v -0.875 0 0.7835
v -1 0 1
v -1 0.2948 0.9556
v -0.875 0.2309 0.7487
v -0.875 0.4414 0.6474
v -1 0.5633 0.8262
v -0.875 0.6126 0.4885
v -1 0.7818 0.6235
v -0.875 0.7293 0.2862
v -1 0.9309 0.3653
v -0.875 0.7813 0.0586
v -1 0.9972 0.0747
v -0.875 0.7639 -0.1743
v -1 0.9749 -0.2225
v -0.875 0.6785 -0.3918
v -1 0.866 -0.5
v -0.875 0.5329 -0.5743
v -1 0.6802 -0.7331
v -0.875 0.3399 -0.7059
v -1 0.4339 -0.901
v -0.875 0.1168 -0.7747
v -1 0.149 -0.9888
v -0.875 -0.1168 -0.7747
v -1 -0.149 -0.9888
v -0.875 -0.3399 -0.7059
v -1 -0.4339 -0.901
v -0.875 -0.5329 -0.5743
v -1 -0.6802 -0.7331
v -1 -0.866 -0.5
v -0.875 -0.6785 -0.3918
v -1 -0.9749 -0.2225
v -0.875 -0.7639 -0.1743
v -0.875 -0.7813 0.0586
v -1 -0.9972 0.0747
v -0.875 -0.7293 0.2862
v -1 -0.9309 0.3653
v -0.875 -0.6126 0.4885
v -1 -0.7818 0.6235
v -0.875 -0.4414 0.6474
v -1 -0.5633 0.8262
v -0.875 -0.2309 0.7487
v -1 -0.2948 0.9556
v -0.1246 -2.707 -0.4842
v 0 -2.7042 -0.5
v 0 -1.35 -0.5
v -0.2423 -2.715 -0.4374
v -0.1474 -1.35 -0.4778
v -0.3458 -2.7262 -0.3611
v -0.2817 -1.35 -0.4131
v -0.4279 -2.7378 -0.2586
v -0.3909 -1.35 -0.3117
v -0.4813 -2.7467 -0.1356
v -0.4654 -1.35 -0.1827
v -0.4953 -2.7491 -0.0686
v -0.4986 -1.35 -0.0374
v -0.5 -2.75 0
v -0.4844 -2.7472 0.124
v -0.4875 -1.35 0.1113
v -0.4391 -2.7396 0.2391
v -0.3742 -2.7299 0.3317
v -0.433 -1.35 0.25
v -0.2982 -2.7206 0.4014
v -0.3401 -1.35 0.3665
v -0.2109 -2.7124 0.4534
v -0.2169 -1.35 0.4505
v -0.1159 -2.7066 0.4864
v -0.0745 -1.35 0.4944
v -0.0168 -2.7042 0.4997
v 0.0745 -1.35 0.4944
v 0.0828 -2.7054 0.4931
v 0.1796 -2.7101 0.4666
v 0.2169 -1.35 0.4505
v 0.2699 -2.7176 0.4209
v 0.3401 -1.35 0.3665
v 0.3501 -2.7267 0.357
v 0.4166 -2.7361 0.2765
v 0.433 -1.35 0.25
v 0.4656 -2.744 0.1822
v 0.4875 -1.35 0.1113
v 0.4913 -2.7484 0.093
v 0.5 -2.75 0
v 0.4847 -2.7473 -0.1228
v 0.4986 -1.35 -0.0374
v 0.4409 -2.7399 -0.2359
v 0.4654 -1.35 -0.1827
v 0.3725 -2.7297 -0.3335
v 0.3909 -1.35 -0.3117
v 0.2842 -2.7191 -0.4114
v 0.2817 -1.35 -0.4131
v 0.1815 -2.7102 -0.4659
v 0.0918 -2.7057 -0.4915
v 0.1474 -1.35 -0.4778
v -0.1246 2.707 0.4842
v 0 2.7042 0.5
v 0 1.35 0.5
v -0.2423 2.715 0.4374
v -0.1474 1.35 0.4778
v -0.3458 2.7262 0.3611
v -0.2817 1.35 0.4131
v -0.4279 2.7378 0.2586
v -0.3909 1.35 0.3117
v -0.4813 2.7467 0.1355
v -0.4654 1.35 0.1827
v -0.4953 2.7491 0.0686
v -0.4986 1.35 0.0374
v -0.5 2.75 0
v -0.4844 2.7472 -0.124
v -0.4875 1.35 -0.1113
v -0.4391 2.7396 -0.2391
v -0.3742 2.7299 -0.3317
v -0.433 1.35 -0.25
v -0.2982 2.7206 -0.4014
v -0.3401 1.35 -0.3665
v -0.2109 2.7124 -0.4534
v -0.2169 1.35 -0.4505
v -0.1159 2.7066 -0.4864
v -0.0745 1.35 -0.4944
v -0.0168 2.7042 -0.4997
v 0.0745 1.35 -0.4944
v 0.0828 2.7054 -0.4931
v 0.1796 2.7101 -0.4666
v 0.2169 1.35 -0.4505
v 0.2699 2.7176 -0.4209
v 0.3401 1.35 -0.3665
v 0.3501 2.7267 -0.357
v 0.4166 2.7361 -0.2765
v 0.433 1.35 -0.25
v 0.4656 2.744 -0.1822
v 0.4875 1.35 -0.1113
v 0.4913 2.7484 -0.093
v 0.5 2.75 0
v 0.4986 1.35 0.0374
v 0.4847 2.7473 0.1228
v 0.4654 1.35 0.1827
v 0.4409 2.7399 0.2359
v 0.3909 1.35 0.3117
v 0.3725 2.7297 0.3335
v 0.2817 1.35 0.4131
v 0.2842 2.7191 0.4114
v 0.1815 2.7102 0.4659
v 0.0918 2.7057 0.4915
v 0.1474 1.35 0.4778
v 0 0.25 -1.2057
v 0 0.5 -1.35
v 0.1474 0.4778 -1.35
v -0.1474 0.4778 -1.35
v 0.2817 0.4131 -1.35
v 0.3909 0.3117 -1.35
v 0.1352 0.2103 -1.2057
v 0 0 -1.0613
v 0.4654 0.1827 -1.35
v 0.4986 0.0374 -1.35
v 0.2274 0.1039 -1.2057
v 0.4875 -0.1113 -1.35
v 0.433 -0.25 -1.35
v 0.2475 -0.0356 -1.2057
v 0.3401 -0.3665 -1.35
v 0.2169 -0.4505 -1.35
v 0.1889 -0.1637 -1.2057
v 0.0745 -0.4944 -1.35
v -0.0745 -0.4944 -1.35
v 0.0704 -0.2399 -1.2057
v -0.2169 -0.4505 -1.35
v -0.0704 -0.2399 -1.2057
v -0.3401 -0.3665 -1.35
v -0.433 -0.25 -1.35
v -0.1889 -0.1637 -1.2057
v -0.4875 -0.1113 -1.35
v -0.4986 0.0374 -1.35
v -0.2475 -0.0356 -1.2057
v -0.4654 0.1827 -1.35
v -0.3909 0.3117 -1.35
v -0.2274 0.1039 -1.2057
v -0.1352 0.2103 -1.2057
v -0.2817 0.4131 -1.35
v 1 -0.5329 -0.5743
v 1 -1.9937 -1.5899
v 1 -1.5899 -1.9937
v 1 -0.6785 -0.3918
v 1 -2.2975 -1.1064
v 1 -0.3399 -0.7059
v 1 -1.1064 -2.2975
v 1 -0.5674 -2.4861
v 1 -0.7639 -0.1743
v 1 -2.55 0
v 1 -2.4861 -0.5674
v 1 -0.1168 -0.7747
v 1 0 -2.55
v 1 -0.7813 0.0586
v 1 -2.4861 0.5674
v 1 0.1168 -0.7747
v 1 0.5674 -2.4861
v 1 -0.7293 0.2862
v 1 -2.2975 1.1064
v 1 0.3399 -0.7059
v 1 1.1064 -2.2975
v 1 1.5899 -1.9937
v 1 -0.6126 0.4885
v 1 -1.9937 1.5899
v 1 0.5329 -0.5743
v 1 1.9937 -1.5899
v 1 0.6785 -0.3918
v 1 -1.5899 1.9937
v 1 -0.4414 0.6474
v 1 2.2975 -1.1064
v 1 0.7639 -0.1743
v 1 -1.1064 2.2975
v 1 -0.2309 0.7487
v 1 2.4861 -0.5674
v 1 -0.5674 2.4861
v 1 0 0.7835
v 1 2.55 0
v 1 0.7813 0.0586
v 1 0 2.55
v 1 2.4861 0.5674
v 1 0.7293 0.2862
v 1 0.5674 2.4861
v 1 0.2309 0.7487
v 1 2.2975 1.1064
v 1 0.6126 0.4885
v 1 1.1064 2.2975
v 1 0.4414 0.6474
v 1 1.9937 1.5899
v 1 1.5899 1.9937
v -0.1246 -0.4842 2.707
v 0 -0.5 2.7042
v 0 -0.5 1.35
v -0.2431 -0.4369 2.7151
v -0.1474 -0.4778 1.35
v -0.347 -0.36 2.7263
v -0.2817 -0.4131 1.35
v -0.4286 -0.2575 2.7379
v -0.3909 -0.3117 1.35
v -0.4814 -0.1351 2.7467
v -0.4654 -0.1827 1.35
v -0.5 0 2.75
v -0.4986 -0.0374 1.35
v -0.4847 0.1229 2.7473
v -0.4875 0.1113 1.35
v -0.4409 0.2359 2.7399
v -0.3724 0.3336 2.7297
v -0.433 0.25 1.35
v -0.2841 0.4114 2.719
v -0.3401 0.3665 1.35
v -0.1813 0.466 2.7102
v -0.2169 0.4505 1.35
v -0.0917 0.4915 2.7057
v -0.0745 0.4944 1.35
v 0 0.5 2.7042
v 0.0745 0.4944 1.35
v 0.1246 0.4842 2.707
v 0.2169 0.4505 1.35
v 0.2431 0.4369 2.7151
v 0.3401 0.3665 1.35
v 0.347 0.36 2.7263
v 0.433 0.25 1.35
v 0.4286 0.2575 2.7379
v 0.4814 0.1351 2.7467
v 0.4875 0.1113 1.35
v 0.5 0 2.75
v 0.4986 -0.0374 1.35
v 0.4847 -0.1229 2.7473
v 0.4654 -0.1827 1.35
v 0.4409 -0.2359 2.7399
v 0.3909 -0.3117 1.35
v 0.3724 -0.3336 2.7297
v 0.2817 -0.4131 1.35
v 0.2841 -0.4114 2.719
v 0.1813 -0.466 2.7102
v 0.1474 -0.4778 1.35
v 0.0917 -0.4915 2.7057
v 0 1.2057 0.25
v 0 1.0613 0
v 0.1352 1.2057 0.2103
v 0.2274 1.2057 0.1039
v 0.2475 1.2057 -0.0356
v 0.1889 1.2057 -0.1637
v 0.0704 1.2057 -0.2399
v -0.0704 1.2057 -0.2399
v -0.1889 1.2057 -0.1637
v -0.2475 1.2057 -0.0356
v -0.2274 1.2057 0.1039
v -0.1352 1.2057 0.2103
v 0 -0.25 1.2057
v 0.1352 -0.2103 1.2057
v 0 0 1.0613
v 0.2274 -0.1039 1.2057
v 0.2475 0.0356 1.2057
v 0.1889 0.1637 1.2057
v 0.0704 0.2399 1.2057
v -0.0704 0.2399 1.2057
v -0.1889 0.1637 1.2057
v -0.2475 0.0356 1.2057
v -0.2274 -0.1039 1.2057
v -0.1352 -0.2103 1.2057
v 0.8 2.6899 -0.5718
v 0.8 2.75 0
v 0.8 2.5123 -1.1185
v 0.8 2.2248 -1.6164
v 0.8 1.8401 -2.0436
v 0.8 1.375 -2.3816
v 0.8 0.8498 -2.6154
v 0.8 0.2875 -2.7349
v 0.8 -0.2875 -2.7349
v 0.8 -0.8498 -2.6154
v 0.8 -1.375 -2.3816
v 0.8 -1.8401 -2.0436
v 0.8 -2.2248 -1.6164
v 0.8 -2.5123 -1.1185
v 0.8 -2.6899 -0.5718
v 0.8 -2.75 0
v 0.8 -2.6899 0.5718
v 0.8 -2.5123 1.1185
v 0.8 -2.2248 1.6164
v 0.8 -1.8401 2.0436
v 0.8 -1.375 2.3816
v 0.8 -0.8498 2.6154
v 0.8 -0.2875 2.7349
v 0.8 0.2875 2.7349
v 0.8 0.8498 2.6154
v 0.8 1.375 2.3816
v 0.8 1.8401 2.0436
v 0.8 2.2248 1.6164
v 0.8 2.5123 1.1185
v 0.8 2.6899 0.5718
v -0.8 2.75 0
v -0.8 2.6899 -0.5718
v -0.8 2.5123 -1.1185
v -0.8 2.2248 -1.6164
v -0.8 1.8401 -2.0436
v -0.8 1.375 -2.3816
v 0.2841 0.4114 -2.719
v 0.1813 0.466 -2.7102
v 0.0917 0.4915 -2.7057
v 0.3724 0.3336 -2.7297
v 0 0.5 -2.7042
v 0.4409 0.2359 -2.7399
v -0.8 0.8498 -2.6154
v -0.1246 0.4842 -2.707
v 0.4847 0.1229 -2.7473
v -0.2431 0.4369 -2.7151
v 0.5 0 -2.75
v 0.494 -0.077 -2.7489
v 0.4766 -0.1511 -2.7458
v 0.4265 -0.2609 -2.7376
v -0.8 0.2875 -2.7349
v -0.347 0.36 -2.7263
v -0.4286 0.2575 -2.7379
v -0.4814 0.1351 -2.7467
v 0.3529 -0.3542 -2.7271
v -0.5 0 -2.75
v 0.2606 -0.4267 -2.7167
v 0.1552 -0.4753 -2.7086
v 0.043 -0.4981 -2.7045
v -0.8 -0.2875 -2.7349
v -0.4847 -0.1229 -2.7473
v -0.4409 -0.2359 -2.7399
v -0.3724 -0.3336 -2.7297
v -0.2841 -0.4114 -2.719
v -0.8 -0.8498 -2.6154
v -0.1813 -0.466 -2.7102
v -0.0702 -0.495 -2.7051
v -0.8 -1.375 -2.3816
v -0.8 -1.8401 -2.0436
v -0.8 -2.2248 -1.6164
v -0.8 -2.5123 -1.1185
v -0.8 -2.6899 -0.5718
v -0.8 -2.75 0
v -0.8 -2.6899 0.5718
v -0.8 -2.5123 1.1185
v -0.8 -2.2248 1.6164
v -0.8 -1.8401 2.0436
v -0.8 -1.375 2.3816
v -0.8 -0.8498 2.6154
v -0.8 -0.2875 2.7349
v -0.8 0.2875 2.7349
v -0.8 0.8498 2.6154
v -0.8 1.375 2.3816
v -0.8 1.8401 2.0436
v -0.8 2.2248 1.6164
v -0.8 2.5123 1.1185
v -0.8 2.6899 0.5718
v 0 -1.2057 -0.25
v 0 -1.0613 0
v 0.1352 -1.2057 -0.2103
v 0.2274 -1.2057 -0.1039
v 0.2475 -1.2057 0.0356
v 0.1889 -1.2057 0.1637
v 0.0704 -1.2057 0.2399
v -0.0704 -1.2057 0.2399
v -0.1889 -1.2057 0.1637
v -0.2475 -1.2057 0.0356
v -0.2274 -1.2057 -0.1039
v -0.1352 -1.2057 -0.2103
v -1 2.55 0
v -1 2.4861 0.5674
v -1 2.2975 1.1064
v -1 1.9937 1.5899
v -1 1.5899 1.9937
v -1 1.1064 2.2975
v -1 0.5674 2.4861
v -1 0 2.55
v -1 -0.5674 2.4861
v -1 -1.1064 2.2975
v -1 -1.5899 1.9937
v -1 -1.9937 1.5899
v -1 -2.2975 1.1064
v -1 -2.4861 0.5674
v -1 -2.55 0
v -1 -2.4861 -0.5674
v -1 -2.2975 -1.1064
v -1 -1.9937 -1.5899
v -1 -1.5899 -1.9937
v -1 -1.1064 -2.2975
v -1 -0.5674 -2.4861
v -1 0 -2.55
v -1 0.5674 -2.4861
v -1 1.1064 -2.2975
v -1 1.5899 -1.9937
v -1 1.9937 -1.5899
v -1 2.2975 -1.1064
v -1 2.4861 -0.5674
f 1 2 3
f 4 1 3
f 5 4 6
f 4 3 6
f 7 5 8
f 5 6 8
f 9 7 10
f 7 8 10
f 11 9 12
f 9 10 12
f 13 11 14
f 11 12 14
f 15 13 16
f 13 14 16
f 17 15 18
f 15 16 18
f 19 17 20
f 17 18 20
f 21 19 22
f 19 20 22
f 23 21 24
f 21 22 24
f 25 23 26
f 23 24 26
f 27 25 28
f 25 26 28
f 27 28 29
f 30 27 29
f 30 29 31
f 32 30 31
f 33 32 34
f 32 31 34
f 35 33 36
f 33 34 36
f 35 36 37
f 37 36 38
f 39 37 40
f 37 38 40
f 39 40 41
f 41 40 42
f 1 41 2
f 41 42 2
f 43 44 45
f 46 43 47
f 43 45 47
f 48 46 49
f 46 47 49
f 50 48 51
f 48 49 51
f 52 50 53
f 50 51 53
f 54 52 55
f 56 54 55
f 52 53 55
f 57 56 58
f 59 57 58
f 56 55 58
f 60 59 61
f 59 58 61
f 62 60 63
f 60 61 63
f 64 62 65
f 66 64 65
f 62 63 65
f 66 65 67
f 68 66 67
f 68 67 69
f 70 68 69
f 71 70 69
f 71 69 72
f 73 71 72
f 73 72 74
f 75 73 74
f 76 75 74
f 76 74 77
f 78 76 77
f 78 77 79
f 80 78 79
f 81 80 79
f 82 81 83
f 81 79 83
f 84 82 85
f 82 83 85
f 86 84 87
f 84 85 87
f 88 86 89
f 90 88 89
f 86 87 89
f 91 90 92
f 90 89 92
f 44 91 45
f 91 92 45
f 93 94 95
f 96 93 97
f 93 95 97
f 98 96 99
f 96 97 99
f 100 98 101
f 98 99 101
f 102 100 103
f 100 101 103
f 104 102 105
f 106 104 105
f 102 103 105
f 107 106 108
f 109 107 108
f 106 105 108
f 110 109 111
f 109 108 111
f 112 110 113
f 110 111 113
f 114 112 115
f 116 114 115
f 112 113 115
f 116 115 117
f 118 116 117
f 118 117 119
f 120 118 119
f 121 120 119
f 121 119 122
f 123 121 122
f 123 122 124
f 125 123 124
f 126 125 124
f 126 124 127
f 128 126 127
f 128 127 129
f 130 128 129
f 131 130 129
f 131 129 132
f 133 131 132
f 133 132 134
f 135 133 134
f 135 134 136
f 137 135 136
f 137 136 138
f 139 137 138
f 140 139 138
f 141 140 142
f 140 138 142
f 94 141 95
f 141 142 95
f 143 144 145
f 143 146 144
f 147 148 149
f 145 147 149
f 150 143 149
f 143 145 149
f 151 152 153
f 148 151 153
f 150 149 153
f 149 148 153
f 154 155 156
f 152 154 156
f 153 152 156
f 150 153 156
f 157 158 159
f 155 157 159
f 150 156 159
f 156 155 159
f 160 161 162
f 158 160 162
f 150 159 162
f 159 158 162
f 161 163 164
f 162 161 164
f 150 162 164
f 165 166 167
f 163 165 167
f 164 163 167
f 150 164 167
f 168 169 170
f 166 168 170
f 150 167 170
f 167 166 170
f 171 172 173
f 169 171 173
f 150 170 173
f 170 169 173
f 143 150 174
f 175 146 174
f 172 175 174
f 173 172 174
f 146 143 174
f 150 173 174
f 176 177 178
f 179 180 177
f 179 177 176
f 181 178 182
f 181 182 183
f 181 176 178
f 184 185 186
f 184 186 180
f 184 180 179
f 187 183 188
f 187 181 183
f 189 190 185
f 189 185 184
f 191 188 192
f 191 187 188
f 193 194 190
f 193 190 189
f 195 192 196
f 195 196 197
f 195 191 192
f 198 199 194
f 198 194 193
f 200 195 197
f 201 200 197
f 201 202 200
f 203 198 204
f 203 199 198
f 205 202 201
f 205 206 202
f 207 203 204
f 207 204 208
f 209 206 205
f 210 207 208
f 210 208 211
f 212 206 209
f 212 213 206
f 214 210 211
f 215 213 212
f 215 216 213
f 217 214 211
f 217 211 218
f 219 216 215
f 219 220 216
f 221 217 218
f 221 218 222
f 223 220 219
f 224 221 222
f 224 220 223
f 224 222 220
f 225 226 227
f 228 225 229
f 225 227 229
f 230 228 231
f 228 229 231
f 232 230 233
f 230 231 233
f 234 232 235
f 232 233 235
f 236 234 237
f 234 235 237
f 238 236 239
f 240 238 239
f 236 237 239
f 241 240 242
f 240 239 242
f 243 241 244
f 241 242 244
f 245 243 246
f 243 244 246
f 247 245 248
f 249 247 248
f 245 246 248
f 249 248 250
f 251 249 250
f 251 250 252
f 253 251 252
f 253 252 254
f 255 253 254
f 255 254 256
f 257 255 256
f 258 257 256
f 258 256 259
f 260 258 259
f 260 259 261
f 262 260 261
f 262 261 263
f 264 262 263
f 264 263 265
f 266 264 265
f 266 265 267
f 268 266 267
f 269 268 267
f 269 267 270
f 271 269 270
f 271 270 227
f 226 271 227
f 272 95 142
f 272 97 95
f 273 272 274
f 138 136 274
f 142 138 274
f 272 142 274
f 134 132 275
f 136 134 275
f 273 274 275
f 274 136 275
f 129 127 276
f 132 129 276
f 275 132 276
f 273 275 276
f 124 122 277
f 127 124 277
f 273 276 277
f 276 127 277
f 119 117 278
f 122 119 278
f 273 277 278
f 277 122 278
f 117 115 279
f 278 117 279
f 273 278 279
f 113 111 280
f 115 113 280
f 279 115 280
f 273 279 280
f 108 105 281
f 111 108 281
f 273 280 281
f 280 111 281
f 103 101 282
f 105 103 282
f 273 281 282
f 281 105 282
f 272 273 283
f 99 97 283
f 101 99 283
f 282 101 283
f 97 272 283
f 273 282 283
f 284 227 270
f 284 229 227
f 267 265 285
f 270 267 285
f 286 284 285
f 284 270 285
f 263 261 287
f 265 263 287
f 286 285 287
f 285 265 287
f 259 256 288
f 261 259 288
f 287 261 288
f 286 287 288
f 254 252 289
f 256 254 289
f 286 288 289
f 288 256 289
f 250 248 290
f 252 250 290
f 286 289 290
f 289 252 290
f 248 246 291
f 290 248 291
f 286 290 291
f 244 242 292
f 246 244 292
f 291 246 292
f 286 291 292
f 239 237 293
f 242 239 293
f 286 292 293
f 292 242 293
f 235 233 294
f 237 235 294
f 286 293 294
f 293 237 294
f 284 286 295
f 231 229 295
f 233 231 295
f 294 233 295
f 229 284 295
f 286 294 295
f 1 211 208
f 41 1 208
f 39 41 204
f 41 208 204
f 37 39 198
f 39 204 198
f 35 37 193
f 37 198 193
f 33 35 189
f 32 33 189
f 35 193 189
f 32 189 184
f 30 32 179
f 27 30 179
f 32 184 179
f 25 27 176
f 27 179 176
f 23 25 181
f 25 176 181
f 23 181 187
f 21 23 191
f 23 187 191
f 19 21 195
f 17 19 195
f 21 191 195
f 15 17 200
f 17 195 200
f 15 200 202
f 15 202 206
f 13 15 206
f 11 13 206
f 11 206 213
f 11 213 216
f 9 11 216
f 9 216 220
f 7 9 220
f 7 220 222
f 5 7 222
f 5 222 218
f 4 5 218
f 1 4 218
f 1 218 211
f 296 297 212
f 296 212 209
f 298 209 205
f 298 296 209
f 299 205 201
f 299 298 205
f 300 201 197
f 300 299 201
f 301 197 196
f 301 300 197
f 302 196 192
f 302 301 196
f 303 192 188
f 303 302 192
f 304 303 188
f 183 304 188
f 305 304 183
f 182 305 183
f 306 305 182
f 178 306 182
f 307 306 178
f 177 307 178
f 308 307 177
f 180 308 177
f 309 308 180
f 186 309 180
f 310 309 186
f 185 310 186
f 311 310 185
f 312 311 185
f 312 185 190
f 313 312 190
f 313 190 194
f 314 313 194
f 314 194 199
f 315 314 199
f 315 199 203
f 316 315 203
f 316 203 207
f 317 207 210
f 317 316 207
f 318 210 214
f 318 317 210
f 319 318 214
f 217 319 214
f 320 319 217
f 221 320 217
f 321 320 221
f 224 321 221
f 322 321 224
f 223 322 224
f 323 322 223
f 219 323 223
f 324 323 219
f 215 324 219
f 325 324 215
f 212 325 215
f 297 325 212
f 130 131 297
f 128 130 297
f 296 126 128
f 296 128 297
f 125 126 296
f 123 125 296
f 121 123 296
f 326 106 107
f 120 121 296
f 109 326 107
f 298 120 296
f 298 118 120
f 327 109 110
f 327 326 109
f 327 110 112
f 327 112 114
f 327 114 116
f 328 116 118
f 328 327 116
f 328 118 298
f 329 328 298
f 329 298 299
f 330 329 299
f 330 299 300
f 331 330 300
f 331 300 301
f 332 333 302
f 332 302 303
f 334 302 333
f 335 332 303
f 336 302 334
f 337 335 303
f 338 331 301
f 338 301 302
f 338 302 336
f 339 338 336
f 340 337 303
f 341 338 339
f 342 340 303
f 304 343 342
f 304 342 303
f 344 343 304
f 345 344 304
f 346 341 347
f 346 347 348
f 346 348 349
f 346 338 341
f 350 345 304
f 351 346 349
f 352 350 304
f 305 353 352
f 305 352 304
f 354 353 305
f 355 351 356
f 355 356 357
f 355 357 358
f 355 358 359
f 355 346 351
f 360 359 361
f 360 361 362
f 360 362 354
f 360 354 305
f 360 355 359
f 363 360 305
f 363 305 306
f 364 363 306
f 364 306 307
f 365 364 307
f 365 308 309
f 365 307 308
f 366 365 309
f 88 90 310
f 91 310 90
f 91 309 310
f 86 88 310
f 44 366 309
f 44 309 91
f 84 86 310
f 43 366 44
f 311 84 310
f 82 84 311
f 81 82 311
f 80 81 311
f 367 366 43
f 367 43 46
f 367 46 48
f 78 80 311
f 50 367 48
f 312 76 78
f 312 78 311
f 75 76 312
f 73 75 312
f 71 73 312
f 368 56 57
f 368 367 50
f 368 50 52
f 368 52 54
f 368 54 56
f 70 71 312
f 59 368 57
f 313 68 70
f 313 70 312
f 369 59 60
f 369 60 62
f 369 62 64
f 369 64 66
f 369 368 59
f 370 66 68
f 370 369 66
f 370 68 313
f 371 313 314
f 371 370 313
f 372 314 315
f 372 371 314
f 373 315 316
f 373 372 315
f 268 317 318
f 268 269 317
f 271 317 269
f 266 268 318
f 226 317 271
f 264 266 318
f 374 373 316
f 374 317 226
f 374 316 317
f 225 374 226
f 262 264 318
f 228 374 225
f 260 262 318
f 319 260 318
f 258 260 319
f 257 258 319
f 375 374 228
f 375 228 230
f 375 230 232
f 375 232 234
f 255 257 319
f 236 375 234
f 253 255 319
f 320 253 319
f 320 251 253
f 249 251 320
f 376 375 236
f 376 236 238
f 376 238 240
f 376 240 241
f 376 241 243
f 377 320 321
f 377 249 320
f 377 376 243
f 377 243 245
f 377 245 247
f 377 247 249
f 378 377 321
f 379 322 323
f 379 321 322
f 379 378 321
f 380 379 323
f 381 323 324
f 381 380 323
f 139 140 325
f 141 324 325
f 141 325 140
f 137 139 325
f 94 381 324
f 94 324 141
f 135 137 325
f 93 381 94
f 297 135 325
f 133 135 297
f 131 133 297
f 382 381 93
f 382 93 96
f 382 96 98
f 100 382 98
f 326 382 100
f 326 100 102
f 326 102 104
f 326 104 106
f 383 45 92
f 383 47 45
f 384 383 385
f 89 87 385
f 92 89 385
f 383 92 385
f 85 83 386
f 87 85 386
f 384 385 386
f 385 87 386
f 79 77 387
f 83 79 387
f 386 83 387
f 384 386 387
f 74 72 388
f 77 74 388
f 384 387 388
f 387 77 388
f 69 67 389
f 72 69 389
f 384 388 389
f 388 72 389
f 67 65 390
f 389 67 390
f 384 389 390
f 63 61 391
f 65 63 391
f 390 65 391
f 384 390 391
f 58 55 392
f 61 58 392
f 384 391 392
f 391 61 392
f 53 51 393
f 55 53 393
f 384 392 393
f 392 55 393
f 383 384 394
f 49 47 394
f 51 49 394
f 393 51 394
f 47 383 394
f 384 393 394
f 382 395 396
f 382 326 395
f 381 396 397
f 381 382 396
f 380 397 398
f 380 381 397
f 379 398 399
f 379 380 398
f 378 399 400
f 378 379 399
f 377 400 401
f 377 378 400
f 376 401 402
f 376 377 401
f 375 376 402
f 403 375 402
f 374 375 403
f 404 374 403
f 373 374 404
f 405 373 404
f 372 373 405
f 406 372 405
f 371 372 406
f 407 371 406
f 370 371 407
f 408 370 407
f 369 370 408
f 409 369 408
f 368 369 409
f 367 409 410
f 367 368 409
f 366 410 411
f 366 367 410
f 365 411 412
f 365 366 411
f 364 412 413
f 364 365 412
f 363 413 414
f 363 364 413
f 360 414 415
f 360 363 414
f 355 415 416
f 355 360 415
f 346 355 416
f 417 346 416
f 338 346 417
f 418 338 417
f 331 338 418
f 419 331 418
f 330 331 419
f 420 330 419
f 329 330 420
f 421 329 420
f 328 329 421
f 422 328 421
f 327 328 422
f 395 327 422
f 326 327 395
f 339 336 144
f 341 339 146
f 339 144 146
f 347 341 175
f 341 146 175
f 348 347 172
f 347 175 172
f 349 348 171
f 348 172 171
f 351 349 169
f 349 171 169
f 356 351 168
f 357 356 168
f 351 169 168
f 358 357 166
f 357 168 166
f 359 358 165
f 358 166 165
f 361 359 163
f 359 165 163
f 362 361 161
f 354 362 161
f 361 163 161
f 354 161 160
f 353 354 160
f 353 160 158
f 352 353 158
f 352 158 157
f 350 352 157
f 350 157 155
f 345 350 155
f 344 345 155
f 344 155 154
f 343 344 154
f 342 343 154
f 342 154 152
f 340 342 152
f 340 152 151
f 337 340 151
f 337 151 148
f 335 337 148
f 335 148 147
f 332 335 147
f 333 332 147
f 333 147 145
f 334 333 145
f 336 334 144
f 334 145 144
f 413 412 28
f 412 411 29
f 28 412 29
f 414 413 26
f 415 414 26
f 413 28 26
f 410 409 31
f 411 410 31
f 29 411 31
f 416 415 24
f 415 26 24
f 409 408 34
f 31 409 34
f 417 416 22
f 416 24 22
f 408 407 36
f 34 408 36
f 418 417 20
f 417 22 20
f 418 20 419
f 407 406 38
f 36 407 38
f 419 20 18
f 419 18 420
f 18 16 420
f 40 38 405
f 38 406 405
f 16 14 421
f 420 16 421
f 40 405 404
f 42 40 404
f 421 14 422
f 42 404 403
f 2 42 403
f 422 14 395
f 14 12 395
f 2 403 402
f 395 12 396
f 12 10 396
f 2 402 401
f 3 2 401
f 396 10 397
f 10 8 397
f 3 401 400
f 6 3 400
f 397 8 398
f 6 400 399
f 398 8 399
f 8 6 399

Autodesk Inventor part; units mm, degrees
ref_plane "YZ Plane" through (0, 0, 0) normal (1, 0, 0) x (0, 1, 0)
sketch "Sketch1" plane through (0, 0, 0) normal (1, 0, 0) x (0, 1, 0)
  circle A0 centre (0, 0) radius 2.75
  dimension "d0" = 5.5
extrude "Body" add sketch "Sketch1" along normal mid plane 2
sketch "Sketch2" plane through (-1, 0, 0) normal (-1, 0, 0) x (0, 0, 1)
  line L0 (0, -3.85) -> (0, 3.85) projected
  line L1 (-3.85, 0) -> (3.85, 0) projected
  point P0 (0, 0)
  point P1 (0, 0)
hole "Thread" at (-1, 0, 0) direction (1, 0, 0) diameter 1.567 end through all thread size "M2x0.4" class "6H" standard "ISO Metric profile"
ref_plane "Work Plane1" through (0, 0, 2.75) normal (0, 0, 1) x (1, 0, 0)
sketch "Sketch3" plane through (0, 0, 2.75) normal (0, 0, 1) x (1, 0, 0)
  line L0 (-1.4, 0) -> (1.4, 0) projected
  line L1 (0, 3.85) -> (0, -3.85) projected
  point P0 (0, 0)
hole "Hole" at (0, 0, 2.75) direction (0, 0, -1) diameter 1 depth 1.4 tip angle 120
pattern_circular "Holes" count 4 over 360 about axis through (-10, 0, 0) along (1, 0, 0) of "Hole"
chamfer "Chamfer1" distance 0.2 angle 45 1 edges at (-1, -2.75, 0) measured on face at (-0.0044, -2.5506, 1.028)
chamfer "Chamfer2" distance 0.2 angle 45 1 edges at (1, -2.75, 0) measured on face at (0.0623, -2.5506, 1.028)
chamfer "Chamfer3" distance 0.2165 angle 30 1 edges at (-1, 0, -0.7835) measured on face at (-1, 1.9346, -0.2349)
ref_plane "Work Plane3" through (7.0312, 0, 0) normal (0, 1, 0) x (-1, 0, 0)
equation "\"d0\" = SD2"
equation "\"d1\" = KOH"
equation "\"d7\" = BOR"
equation "\"d9\" = ANG"
equation "\"d8\" = LOTI"
equation "\"d3\" = PHH1"
equation "\"d61\" = PHH1"
equation "\"d5\" = PHH"
equation "\"d62\" = PHH"
equation "\"d12\" = -0.5 * GD1 + 0.5 * NND"
equation "\"d63\" = -0.5 * GD1 + 0.5 * NND"
equation "\"FAWI1\" = 45deg"
equation "\"FAWI\" = 45deg"
equation "\"ANG\" = 120deg"
equation "\"NND\" = 2"
equation "\"KOH\" = 2"
equation "\"SD2\" = 5.5"
equation "\"BOR\" = 1"
equation "\"LOTI\" = 1.4"
equation "\"PHH\" = 0.2"
equation "\"PHH1\" = PHH"
equation "\"GUL\" = 0.541266 * PTC"
equation "\"THREADDIA\" = 2"
equation "\"PTC\" = 0.4"
equation "\"GAL\" = 0.541266 * PTC"
equation "\"TOA\" = 30deg"
equation "\"GD1\" = 1.566987"
properties part number "CNS 4433 - M 2" material "Steel, Mild"
